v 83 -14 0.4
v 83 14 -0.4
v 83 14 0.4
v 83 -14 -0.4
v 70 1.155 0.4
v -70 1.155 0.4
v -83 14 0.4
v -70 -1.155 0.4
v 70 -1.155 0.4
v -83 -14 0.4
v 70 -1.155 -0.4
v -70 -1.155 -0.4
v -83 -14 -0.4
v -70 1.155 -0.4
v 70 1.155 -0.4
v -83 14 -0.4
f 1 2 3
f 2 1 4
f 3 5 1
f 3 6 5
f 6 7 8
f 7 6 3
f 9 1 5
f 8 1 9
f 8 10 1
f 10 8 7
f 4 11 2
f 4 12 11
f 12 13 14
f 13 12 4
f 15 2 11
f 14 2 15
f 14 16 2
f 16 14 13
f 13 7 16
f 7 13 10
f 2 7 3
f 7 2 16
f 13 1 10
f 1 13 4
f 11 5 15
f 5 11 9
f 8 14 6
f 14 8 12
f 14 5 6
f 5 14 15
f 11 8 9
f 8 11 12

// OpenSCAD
difference() {
  cube([166,28,0.8],center=true);
  cube([140,2.31,1],center=true);
}
